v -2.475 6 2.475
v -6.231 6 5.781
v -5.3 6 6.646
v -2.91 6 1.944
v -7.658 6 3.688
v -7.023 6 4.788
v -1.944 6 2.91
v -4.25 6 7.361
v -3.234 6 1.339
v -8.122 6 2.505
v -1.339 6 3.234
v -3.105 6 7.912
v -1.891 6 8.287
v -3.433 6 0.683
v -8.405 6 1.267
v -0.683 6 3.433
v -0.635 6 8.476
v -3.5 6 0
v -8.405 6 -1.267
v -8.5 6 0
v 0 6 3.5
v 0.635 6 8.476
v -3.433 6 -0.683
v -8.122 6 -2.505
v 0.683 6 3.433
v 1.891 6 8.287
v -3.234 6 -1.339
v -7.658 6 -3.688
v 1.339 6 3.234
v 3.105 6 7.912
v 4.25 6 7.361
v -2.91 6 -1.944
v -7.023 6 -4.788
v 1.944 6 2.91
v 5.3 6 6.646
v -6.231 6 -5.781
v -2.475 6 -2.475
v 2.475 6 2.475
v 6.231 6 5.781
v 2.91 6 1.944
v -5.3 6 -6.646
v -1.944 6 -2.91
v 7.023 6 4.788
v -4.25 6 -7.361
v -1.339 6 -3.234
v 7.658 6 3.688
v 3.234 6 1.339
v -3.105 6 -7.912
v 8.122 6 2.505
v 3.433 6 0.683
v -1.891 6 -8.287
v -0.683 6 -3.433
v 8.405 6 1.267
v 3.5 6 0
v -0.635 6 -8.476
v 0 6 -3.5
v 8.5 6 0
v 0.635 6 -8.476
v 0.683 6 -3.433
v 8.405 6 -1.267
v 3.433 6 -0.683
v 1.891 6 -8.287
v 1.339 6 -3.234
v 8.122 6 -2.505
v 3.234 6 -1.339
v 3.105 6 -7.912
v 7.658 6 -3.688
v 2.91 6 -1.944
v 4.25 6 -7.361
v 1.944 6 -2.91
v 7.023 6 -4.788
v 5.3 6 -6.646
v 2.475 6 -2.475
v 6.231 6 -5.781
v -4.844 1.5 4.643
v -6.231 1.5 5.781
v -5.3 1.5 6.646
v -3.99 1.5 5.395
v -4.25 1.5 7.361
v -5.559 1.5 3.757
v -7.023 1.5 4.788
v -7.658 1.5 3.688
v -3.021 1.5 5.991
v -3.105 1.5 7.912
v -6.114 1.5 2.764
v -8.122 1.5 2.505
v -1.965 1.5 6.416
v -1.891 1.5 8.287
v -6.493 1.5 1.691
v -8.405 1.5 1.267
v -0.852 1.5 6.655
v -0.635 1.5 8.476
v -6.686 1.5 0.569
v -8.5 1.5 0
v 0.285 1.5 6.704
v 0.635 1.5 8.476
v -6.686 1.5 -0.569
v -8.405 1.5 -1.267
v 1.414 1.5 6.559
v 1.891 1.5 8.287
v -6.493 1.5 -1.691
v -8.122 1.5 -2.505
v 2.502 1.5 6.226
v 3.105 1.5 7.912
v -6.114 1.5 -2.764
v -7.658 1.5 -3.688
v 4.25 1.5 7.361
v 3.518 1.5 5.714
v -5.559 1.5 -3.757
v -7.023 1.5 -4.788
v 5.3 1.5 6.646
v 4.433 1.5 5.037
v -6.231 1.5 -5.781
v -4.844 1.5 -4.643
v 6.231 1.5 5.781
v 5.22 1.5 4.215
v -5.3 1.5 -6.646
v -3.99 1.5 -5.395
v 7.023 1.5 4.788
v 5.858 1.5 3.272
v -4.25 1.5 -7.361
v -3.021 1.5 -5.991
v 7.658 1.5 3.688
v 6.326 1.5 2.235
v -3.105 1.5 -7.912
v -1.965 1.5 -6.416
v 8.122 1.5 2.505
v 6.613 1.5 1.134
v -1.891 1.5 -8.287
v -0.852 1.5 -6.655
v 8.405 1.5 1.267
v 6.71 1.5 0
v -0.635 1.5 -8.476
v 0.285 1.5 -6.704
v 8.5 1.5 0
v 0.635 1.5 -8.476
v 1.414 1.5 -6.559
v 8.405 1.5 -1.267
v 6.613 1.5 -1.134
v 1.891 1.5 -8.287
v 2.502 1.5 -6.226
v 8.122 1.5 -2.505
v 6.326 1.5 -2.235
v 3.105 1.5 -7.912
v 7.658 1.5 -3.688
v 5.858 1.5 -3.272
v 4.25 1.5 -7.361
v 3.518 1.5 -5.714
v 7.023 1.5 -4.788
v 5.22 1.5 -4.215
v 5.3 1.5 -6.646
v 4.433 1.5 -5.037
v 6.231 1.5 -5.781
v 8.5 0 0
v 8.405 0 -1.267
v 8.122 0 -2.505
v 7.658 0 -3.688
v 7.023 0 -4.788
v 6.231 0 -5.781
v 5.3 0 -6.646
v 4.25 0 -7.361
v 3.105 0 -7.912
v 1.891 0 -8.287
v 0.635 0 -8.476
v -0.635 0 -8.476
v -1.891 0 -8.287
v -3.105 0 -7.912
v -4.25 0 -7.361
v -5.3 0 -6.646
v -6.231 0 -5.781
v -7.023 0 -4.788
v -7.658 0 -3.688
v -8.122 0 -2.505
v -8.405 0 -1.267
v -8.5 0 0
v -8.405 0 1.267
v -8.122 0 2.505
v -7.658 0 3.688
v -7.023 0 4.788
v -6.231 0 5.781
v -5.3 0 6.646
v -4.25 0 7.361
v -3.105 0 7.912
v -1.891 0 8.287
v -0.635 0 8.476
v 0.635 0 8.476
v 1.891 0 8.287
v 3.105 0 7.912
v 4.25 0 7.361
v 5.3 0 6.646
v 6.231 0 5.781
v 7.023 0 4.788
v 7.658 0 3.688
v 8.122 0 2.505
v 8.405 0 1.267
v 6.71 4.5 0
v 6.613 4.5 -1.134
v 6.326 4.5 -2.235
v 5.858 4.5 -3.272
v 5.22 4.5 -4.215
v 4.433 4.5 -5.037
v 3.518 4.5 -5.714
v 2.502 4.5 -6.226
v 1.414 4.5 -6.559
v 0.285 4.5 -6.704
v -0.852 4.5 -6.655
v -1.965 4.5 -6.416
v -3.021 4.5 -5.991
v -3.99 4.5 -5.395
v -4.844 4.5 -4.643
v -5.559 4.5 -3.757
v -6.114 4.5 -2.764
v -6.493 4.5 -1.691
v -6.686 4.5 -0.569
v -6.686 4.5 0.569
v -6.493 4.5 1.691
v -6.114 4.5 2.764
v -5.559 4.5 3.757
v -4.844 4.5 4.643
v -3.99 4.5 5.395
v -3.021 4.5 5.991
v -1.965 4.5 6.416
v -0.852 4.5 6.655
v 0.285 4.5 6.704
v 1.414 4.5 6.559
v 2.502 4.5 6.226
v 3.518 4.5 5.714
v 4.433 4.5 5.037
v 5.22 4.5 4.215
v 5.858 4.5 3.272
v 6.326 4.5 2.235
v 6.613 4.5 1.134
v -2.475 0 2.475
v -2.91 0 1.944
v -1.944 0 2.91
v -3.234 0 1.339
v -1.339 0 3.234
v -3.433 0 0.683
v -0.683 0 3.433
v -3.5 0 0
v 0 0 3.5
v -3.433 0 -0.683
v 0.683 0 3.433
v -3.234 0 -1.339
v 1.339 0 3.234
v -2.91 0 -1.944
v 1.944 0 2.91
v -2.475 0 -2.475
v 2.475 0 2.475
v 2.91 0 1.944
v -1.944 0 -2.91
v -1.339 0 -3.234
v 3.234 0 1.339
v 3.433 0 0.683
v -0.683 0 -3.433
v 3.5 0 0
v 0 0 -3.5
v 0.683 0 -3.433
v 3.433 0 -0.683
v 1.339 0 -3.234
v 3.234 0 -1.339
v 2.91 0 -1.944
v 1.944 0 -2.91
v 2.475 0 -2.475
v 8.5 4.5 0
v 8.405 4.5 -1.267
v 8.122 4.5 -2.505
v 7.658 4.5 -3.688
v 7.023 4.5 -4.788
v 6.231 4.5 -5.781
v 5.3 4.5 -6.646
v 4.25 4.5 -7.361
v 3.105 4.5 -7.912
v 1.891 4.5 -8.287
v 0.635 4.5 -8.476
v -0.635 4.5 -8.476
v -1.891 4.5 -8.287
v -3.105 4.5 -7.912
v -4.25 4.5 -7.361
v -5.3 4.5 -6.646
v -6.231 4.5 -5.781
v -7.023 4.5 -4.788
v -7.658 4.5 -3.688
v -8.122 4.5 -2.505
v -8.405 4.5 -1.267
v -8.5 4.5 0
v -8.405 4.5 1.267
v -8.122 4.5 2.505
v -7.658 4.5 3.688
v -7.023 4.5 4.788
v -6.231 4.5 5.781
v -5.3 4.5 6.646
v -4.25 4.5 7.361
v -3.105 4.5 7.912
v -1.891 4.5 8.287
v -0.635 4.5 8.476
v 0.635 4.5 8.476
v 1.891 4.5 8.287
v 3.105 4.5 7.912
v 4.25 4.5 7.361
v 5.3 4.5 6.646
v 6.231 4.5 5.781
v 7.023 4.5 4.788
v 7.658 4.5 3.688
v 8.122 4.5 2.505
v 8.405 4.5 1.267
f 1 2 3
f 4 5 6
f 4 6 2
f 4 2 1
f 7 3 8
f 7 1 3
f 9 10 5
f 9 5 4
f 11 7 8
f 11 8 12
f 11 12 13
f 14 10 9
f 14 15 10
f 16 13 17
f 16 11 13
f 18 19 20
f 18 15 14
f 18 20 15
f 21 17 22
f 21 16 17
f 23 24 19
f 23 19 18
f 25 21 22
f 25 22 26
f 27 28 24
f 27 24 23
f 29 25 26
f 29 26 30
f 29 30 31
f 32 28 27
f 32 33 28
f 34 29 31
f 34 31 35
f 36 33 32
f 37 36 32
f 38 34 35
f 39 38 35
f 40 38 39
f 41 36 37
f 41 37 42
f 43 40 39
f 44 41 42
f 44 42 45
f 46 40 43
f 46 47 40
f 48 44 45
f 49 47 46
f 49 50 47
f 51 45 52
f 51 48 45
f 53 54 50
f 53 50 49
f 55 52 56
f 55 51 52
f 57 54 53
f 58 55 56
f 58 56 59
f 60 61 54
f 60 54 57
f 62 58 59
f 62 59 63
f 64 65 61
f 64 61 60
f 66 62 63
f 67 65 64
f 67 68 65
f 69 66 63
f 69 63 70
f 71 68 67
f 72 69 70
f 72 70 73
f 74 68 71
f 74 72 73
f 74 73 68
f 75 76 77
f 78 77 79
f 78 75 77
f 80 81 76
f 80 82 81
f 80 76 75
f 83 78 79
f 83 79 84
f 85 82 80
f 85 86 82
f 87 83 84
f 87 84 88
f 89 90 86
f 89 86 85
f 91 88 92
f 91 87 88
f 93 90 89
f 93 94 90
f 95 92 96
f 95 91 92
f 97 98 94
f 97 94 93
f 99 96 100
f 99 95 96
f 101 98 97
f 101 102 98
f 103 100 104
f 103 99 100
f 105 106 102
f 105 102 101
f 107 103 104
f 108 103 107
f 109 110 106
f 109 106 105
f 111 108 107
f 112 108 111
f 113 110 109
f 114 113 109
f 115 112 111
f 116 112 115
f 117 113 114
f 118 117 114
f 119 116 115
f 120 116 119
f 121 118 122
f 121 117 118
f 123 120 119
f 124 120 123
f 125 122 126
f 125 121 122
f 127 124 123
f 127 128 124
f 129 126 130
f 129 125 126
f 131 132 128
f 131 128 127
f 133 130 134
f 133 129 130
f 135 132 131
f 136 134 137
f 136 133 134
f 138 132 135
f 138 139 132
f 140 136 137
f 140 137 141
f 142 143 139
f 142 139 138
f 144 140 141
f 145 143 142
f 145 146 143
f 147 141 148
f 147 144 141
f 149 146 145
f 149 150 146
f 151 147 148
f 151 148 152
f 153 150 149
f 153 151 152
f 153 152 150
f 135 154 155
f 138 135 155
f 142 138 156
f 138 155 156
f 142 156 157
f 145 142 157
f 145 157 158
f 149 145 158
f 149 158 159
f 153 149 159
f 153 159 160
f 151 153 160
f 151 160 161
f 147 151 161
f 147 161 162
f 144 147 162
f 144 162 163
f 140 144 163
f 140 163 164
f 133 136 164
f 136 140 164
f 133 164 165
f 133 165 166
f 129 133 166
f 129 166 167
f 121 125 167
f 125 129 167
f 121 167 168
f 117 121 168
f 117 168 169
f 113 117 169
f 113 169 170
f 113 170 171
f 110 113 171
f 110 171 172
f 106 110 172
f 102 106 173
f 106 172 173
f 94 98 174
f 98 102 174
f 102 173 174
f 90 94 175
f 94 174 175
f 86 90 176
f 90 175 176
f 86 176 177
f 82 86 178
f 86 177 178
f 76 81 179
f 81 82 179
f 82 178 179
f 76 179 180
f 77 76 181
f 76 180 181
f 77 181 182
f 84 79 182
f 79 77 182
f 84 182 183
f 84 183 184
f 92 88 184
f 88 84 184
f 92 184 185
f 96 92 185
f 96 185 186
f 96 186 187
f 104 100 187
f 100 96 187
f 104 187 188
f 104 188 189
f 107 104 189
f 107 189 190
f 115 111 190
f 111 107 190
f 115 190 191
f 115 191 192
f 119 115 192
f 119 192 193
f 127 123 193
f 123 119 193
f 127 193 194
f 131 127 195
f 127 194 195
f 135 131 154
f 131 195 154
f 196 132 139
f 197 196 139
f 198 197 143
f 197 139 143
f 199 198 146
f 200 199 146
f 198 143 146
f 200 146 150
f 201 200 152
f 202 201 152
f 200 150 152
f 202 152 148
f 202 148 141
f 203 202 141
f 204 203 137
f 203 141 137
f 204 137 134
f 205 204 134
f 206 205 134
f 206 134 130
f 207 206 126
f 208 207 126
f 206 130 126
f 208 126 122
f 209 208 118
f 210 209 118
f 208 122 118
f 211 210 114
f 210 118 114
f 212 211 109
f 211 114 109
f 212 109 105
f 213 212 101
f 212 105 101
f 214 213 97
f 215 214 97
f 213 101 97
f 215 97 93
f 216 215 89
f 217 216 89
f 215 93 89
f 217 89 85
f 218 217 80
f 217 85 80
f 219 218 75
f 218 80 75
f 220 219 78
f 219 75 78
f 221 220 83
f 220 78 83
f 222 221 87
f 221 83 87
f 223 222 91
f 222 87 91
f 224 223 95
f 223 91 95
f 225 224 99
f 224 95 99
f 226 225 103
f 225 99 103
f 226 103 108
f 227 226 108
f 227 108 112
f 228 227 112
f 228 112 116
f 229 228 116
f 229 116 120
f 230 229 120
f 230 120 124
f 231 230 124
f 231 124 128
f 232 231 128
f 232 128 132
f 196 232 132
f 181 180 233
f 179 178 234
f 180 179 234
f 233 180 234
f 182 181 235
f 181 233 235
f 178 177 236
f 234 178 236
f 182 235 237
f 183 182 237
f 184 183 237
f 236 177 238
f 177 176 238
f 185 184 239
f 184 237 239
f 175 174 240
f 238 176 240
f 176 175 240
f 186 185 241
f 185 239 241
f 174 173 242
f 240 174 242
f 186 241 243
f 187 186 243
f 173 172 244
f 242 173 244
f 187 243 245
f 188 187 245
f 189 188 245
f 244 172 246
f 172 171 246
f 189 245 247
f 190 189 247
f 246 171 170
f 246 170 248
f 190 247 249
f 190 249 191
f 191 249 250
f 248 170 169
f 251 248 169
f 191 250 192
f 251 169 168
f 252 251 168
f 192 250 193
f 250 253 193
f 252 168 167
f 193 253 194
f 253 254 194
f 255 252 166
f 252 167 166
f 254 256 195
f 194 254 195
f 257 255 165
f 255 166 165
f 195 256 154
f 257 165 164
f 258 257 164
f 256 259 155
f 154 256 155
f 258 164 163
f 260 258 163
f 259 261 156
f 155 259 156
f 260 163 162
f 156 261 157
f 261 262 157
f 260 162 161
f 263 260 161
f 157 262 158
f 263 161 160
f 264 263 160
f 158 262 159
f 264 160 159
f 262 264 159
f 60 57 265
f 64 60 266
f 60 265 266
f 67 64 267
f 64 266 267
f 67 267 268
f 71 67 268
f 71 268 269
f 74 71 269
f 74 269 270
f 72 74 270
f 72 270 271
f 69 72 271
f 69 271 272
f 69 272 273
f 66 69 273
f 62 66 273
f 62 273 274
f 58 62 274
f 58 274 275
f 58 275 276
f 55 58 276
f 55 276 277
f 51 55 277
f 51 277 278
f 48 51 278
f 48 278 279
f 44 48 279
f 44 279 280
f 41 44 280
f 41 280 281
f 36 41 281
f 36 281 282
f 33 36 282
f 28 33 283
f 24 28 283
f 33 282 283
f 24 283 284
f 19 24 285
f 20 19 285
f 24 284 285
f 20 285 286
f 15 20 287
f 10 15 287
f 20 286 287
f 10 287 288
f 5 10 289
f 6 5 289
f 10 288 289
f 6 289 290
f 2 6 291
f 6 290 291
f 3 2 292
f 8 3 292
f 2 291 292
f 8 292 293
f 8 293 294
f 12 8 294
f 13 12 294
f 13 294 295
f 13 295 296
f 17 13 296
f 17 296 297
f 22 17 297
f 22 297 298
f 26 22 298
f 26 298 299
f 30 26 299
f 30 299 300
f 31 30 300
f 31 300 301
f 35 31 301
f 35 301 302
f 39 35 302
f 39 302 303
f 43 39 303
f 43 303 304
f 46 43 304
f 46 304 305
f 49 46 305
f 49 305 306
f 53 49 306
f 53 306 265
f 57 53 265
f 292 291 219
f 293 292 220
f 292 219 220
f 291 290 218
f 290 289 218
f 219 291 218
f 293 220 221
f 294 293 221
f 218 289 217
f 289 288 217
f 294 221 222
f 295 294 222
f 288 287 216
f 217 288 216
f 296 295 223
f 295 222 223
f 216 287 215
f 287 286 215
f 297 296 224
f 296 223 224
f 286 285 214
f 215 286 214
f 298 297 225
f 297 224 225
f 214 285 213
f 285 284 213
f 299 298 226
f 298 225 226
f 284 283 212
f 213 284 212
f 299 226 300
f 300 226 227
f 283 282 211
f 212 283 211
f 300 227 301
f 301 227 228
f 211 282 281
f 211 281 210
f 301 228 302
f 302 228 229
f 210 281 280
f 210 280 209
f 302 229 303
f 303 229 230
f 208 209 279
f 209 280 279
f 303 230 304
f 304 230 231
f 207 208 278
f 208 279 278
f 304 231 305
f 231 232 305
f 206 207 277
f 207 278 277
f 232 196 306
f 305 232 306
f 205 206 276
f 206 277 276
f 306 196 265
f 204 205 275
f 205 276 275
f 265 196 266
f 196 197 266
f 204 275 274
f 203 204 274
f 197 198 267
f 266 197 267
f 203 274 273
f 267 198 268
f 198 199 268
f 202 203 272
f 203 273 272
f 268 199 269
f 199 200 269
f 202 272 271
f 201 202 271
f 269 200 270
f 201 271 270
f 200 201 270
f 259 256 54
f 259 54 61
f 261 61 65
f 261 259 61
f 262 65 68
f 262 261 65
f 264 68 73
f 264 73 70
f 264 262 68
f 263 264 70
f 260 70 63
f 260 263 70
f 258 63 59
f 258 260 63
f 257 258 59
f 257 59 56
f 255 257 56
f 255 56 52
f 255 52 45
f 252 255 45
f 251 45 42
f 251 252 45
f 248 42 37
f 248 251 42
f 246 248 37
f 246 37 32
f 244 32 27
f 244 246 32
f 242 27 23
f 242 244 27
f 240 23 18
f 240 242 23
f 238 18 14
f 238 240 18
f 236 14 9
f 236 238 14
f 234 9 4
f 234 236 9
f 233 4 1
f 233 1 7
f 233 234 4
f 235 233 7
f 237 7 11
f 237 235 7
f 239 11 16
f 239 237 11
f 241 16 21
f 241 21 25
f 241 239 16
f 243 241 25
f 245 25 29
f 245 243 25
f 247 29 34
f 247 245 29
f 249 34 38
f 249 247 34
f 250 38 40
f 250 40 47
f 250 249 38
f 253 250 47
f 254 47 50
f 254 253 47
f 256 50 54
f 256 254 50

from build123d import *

# Parameters (mm, degrees)
SKIZZE1_R                       = 8.5
SKIZZE1_R_2                     = 3.5
AUFSATZ_LINEAR_AUSTRAGEN1_DEPTH = 6
SCHNITT_LINEAR_START            = 1.5
SKIZZE2_R                       = 13.890066822
SKIZZE2_R_2                     = 6.709730291
SCHNITT_LINEAR_AUSTRAGEN1_DEPTH = 3


with BuildPart() as part:
    # Skizze1 → Aufsatz-Linear austragen1 (new body)
    with BuildSketch(Plane(origin=(0, 0, 0), x_dir=(1, 0, 0), z_dir=(0, 1, 0))):
        Circle(SKIZZE1_R)
        Circle(SKIZZE1_R_2, mode=Mode.SUBTRACT)
    extrude(amount=AUFSATZ_LINEAR_AUSTRAGEN1_DEPTH)

    # Skizze2 → Schnitt-Linear austragen1 (cut)
    with BuildSketch(Plane(origin=(0, 0, 0), x_dir=(1, 0, 0), z_dir=(0, 1, 0)).offset(SCHNITT_LINEAR_START)):
        Circle(SKIZZE2_R)
        Circle(SKIZZE2_R_2, mode=Mode.SUBTRACT)
    extrude(amount=SCHNITT_LINEAR_AUSTRAGEN1_DEPTH, mode=Mode.SUBTRACT)


solid = part.part
